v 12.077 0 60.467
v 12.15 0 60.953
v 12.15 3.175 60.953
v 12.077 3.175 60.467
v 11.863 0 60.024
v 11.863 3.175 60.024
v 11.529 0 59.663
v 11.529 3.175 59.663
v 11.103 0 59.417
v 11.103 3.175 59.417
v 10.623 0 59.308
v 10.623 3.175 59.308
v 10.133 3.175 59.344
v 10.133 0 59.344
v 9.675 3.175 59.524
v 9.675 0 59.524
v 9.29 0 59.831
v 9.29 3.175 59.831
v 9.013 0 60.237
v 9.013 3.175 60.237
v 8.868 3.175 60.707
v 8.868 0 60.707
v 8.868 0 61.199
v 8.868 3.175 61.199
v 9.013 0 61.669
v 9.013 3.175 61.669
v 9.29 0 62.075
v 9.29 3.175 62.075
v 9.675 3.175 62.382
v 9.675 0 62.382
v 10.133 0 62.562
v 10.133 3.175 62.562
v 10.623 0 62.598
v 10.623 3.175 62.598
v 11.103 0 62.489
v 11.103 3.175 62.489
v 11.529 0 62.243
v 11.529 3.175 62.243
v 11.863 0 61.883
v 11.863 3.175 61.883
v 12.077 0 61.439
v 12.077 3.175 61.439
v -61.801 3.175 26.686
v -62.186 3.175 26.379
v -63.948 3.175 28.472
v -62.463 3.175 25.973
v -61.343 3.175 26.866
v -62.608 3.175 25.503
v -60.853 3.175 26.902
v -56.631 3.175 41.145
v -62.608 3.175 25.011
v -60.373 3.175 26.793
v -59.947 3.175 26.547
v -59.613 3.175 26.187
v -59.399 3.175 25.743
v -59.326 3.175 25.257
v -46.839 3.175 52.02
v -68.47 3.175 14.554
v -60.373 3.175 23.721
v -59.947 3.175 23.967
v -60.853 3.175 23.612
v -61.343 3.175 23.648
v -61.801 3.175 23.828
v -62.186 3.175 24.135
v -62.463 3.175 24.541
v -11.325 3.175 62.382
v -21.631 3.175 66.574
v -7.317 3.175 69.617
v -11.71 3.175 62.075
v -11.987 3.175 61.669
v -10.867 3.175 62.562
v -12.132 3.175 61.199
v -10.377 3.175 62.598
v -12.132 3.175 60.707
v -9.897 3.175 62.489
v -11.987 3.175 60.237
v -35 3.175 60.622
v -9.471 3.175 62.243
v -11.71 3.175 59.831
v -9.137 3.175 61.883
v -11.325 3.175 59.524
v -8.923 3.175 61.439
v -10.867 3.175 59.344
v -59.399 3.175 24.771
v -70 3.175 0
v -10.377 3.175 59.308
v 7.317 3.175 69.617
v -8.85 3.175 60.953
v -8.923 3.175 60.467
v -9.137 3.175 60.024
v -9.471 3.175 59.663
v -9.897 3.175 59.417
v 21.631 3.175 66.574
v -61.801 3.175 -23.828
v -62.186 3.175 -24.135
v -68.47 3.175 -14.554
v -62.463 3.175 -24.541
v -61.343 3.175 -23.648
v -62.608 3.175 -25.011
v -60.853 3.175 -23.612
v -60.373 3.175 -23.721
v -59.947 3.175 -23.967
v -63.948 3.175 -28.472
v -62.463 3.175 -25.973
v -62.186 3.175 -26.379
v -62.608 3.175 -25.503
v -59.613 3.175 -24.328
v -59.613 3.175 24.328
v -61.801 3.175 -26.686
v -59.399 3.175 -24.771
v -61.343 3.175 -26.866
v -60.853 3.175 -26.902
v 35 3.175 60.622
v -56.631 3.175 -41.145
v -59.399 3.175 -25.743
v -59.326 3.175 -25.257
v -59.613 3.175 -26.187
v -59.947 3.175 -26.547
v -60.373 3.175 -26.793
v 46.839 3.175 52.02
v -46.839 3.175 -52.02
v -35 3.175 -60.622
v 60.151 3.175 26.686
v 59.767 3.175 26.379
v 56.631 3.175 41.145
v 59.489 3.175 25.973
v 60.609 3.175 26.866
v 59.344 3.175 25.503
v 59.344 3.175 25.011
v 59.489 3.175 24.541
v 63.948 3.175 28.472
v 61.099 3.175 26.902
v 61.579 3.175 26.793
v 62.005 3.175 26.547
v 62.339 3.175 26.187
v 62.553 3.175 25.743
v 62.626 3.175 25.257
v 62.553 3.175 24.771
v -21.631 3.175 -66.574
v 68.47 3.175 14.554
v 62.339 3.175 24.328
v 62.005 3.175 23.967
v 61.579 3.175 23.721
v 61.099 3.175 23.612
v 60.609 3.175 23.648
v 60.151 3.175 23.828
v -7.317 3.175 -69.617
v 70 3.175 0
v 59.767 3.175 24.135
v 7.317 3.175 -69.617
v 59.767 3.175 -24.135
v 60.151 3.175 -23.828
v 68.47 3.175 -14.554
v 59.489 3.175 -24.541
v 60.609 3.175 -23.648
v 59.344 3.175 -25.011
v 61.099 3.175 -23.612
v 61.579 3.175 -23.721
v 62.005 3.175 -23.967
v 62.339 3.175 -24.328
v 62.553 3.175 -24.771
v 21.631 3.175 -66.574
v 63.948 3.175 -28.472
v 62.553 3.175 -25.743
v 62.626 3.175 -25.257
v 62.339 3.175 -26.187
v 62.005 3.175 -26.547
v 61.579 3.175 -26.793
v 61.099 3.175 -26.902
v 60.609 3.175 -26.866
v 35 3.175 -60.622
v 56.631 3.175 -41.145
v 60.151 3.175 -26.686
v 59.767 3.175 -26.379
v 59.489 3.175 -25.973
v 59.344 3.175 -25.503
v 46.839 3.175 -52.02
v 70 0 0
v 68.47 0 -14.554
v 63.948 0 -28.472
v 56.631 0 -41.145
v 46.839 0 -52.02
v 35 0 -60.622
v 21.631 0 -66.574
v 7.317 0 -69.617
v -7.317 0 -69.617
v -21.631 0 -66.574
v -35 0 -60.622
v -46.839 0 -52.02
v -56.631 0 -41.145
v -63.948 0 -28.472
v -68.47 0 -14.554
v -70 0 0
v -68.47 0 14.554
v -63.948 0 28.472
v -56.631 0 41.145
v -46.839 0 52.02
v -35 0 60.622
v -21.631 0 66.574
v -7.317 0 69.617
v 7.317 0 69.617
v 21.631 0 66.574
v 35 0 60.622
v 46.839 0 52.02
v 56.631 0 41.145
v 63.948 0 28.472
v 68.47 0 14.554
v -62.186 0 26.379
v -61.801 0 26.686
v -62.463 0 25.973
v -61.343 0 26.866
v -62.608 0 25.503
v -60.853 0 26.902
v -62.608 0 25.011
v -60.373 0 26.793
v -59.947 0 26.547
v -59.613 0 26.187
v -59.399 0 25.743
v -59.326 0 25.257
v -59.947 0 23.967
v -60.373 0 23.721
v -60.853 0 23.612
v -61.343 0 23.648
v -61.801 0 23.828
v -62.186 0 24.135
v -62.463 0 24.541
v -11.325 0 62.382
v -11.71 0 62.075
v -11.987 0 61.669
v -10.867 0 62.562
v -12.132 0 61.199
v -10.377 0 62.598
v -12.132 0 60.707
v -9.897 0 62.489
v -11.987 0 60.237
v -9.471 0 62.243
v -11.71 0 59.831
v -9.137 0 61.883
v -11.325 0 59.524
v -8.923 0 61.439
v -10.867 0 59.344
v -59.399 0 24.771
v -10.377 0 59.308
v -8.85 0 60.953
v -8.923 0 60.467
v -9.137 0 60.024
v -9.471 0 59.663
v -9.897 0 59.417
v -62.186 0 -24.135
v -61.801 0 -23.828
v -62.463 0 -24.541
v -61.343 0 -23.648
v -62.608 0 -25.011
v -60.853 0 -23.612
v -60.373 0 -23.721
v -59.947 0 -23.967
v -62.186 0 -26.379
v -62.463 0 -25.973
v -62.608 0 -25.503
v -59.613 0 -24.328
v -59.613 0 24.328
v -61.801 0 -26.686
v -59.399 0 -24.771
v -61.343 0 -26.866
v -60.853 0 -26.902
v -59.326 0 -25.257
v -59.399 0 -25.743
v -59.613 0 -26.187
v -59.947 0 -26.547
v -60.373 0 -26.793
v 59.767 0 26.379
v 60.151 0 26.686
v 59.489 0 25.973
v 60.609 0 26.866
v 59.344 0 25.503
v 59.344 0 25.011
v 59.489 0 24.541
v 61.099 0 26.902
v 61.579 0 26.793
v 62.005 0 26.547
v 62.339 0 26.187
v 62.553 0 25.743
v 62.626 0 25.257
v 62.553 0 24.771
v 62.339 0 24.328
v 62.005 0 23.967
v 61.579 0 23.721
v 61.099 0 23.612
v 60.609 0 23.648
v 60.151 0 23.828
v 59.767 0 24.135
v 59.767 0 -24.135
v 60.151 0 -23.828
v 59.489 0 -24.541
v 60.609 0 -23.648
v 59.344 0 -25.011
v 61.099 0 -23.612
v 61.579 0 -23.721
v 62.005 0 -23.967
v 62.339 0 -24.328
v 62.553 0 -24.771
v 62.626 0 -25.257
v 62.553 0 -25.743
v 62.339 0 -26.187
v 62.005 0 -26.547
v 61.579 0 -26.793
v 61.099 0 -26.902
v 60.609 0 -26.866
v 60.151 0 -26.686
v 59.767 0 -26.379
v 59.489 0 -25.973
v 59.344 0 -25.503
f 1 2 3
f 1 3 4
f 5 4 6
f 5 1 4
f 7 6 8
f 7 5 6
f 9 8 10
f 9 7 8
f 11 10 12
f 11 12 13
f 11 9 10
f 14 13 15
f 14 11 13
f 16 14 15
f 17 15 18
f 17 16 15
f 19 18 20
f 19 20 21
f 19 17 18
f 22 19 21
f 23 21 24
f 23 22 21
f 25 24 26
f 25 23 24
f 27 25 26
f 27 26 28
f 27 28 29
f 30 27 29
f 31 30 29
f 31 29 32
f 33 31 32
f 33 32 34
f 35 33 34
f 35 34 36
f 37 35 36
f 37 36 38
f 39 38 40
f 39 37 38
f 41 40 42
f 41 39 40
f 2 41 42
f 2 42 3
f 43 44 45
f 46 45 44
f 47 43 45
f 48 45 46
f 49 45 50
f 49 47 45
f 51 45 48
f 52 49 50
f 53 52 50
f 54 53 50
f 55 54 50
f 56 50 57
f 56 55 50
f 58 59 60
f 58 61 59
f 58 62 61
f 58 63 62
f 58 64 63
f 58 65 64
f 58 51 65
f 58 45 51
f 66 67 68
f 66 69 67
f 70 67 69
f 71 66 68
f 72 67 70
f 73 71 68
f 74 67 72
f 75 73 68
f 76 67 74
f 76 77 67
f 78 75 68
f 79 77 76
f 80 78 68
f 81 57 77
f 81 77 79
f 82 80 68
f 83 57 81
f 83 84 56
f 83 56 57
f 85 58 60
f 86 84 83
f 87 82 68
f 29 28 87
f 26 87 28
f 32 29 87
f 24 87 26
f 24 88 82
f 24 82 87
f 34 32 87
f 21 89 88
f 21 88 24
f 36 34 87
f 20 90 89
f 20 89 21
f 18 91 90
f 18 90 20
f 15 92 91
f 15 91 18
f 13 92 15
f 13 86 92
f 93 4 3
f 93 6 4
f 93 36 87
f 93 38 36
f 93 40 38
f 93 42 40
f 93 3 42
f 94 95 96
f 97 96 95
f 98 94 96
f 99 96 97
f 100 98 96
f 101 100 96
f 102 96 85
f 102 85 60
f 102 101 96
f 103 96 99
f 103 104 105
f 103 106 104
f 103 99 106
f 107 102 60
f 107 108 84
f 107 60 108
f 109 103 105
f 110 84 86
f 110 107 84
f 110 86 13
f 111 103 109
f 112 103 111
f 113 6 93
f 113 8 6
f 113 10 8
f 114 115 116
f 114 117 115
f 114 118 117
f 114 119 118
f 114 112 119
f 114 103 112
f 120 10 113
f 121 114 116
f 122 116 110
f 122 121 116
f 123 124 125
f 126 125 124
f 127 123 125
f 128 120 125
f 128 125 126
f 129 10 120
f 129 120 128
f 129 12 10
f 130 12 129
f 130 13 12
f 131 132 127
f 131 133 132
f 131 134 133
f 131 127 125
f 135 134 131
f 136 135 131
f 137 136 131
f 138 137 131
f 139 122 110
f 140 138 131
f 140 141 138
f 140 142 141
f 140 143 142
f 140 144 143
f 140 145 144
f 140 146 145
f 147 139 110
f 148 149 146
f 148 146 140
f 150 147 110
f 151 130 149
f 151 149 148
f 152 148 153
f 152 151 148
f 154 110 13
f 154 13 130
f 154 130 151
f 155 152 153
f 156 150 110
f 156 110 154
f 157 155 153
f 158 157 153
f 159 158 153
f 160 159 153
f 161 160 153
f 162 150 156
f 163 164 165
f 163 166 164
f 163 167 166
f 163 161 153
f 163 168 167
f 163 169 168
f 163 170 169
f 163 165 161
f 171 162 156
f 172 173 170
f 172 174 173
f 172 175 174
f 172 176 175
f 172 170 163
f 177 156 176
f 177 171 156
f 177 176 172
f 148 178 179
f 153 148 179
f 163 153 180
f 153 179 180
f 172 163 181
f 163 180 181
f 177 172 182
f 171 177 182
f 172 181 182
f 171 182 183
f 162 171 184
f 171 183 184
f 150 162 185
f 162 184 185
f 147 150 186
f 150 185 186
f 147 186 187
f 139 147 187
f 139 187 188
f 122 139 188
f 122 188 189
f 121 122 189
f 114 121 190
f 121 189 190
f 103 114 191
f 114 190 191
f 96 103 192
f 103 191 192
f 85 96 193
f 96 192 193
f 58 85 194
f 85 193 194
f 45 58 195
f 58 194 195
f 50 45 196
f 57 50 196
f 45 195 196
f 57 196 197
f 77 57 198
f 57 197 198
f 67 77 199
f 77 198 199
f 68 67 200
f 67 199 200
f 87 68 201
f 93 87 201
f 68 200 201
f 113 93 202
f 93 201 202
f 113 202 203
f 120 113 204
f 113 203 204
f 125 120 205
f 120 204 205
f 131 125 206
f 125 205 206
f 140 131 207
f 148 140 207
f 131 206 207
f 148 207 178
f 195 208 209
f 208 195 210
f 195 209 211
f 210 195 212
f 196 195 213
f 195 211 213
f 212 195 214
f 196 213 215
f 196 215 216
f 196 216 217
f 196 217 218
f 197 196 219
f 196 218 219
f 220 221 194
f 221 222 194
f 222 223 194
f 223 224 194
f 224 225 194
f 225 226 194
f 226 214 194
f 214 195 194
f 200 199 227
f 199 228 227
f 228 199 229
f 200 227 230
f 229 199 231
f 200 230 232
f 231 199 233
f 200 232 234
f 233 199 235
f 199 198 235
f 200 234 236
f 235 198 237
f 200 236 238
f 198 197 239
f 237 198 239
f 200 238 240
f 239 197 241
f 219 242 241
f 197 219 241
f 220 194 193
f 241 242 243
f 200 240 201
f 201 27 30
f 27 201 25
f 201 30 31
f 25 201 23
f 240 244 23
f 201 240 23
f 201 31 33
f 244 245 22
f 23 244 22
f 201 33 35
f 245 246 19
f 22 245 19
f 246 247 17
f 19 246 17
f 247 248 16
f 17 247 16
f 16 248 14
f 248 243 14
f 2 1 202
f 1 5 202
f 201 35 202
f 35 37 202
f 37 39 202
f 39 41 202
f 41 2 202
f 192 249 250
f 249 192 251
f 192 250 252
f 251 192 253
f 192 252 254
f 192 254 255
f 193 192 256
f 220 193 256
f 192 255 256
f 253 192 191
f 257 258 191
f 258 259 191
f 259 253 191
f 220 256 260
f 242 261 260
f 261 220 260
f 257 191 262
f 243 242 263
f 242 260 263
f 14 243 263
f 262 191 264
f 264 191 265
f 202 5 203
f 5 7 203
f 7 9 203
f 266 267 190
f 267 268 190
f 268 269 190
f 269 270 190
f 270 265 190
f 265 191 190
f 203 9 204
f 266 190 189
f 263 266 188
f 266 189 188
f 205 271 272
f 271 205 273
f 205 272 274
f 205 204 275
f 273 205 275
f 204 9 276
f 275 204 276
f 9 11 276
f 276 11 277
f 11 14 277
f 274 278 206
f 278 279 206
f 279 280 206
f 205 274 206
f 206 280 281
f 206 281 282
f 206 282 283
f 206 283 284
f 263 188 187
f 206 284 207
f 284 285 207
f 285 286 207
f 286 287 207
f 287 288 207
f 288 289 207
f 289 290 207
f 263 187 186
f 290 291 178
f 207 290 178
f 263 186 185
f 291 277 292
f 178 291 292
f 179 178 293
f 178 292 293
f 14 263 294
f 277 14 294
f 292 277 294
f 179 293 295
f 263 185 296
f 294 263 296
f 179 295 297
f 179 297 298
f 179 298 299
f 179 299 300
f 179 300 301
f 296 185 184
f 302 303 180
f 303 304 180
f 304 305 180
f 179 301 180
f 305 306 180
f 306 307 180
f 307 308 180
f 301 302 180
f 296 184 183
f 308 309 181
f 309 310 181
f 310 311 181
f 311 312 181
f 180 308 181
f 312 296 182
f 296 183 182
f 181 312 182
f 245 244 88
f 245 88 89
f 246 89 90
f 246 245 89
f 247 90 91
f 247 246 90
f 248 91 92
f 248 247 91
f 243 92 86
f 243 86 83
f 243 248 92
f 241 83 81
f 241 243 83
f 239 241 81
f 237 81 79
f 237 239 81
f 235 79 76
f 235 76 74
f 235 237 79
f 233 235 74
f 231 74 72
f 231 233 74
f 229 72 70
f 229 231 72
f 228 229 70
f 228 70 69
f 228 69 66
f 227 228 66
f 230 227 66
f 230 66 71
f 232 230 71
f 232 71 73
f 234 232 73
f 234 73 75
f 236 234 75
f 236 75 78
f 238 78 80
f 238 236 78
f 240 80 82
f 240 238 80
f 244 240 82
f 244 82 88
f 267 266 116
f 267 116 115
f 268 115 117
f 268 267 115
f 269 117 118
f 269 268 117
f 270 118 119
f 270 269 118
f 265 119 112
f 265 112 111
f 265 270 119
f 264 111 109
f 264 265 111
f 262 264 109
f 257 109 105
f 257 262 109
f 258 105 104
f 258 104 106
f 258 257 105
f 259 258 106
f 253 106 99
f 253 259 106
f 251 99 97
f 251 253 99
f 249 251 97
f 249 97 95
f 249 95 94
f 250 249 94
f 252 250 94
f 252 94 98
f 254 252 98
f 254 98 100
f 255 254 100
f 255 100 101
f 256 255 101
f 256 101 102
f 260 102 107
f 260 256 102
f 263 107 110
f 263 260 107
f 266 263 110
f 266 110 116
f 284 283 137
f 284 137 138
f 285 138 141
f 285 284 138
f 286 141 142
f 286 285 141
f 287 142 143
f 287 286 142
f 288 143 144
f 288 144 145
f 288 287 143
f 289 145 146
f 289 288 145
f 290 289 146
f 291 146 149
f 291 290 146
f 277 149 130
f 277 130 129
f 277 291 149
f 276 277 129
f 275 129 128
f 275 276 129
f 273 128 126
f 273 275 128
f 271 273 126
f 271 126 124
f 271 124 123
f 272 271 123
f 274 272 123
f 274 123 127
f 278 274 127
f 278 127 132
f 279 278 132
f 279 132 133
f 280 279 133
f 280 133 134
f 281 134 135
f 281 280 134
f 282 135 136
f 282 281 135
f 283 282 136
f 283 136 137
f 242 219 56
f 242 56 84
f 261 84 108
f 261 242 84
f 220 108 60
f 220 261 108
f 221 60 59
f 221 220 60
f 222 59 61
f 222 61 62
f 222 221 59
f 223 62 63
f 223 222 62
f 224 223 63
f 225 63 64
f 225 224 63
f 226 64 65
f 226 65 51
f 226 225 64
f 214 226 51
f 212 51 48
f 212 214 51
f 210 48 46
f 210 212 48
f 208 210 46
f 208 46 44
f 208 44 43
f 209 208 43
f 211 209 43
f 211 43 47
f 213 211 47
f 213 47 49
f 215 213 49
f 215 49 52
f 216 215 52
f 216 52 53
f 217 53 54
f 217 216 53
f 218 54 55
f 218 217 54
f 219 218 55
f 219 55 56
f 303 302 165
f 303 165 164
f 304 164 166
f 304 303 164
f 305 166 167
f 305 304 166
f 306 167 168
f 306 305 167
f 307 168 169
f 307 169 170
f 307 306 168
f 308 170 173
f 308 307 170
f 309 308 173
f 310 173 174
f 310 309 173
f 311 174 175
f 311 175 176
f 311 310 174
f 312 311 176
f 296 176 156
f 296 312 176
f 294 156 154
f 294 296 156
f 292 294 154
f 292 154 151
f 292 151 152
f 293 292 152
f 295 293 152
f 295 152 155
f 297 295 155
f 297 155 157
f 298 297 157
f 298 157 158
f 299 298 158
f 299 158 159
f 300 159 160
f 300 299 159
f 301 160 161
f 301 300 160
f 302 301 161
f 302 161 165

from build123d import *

# Parameters (mm, degrees)
BASE_W_MOTOR_MOUNTS_R  = 70
BOSS_EXTRUDE1_DEPTH    = 3.175
STANDOFFS_TOP_BOTTOM_R = 1.65
CUT_EXTRUDE2_DEPTH     = 3.175


with BuildPart() as part:
    # Base w/ Motor Mounts → Boss-Extrude1 (new body)
    with BuildSketch(Plane(origin=(0, 0, 0), x_dir=(1, 0, 0), z_dir=(0, 1, 0))):
        Circle(BASE_W_MOTOR_MOUNTS_R)
    extrude(amount=BOSS_EXTRUDE1_DEPTH)

    # Standoffs (top / bottom) → Cut-Extrude2 (cut)
    with BuildSketch(Plane(origin=(0, 0, 0), x_dir=(1, 0, 0), z_dir=(0, 1, 0))):
        with Locations((60.976049146, 25.257106536)):
            Circle(STANDOFFS_TOP_BOTTOM_R)
        with Locations((60.976049146, -25.257106536)):
            Circle(STANDOFFS_TOP_BOTTOM_R)
        with Locations((-60.976049146, -25.257106536)):
            Circle(STANDOFFS_TOP_BOTTOM_R)
        with Locations((-60.976049146, 25.257106536)):
            Circle(STANDOFFS_TOP_BOTTOM_R)
        with Locations((10.5, -60.953059289)):
            Circle(STANDOFFS_TOP_BOTTOM_R)
        with Locations((-10.5, -60.953059289)):
            Circle(STANDOFFS_TOP_BOTTOM_R)
    extrude(amount=CUT_EXTRUDE2_DEPTH, mode=Mode.SUBTRACT)


solid = part.part
